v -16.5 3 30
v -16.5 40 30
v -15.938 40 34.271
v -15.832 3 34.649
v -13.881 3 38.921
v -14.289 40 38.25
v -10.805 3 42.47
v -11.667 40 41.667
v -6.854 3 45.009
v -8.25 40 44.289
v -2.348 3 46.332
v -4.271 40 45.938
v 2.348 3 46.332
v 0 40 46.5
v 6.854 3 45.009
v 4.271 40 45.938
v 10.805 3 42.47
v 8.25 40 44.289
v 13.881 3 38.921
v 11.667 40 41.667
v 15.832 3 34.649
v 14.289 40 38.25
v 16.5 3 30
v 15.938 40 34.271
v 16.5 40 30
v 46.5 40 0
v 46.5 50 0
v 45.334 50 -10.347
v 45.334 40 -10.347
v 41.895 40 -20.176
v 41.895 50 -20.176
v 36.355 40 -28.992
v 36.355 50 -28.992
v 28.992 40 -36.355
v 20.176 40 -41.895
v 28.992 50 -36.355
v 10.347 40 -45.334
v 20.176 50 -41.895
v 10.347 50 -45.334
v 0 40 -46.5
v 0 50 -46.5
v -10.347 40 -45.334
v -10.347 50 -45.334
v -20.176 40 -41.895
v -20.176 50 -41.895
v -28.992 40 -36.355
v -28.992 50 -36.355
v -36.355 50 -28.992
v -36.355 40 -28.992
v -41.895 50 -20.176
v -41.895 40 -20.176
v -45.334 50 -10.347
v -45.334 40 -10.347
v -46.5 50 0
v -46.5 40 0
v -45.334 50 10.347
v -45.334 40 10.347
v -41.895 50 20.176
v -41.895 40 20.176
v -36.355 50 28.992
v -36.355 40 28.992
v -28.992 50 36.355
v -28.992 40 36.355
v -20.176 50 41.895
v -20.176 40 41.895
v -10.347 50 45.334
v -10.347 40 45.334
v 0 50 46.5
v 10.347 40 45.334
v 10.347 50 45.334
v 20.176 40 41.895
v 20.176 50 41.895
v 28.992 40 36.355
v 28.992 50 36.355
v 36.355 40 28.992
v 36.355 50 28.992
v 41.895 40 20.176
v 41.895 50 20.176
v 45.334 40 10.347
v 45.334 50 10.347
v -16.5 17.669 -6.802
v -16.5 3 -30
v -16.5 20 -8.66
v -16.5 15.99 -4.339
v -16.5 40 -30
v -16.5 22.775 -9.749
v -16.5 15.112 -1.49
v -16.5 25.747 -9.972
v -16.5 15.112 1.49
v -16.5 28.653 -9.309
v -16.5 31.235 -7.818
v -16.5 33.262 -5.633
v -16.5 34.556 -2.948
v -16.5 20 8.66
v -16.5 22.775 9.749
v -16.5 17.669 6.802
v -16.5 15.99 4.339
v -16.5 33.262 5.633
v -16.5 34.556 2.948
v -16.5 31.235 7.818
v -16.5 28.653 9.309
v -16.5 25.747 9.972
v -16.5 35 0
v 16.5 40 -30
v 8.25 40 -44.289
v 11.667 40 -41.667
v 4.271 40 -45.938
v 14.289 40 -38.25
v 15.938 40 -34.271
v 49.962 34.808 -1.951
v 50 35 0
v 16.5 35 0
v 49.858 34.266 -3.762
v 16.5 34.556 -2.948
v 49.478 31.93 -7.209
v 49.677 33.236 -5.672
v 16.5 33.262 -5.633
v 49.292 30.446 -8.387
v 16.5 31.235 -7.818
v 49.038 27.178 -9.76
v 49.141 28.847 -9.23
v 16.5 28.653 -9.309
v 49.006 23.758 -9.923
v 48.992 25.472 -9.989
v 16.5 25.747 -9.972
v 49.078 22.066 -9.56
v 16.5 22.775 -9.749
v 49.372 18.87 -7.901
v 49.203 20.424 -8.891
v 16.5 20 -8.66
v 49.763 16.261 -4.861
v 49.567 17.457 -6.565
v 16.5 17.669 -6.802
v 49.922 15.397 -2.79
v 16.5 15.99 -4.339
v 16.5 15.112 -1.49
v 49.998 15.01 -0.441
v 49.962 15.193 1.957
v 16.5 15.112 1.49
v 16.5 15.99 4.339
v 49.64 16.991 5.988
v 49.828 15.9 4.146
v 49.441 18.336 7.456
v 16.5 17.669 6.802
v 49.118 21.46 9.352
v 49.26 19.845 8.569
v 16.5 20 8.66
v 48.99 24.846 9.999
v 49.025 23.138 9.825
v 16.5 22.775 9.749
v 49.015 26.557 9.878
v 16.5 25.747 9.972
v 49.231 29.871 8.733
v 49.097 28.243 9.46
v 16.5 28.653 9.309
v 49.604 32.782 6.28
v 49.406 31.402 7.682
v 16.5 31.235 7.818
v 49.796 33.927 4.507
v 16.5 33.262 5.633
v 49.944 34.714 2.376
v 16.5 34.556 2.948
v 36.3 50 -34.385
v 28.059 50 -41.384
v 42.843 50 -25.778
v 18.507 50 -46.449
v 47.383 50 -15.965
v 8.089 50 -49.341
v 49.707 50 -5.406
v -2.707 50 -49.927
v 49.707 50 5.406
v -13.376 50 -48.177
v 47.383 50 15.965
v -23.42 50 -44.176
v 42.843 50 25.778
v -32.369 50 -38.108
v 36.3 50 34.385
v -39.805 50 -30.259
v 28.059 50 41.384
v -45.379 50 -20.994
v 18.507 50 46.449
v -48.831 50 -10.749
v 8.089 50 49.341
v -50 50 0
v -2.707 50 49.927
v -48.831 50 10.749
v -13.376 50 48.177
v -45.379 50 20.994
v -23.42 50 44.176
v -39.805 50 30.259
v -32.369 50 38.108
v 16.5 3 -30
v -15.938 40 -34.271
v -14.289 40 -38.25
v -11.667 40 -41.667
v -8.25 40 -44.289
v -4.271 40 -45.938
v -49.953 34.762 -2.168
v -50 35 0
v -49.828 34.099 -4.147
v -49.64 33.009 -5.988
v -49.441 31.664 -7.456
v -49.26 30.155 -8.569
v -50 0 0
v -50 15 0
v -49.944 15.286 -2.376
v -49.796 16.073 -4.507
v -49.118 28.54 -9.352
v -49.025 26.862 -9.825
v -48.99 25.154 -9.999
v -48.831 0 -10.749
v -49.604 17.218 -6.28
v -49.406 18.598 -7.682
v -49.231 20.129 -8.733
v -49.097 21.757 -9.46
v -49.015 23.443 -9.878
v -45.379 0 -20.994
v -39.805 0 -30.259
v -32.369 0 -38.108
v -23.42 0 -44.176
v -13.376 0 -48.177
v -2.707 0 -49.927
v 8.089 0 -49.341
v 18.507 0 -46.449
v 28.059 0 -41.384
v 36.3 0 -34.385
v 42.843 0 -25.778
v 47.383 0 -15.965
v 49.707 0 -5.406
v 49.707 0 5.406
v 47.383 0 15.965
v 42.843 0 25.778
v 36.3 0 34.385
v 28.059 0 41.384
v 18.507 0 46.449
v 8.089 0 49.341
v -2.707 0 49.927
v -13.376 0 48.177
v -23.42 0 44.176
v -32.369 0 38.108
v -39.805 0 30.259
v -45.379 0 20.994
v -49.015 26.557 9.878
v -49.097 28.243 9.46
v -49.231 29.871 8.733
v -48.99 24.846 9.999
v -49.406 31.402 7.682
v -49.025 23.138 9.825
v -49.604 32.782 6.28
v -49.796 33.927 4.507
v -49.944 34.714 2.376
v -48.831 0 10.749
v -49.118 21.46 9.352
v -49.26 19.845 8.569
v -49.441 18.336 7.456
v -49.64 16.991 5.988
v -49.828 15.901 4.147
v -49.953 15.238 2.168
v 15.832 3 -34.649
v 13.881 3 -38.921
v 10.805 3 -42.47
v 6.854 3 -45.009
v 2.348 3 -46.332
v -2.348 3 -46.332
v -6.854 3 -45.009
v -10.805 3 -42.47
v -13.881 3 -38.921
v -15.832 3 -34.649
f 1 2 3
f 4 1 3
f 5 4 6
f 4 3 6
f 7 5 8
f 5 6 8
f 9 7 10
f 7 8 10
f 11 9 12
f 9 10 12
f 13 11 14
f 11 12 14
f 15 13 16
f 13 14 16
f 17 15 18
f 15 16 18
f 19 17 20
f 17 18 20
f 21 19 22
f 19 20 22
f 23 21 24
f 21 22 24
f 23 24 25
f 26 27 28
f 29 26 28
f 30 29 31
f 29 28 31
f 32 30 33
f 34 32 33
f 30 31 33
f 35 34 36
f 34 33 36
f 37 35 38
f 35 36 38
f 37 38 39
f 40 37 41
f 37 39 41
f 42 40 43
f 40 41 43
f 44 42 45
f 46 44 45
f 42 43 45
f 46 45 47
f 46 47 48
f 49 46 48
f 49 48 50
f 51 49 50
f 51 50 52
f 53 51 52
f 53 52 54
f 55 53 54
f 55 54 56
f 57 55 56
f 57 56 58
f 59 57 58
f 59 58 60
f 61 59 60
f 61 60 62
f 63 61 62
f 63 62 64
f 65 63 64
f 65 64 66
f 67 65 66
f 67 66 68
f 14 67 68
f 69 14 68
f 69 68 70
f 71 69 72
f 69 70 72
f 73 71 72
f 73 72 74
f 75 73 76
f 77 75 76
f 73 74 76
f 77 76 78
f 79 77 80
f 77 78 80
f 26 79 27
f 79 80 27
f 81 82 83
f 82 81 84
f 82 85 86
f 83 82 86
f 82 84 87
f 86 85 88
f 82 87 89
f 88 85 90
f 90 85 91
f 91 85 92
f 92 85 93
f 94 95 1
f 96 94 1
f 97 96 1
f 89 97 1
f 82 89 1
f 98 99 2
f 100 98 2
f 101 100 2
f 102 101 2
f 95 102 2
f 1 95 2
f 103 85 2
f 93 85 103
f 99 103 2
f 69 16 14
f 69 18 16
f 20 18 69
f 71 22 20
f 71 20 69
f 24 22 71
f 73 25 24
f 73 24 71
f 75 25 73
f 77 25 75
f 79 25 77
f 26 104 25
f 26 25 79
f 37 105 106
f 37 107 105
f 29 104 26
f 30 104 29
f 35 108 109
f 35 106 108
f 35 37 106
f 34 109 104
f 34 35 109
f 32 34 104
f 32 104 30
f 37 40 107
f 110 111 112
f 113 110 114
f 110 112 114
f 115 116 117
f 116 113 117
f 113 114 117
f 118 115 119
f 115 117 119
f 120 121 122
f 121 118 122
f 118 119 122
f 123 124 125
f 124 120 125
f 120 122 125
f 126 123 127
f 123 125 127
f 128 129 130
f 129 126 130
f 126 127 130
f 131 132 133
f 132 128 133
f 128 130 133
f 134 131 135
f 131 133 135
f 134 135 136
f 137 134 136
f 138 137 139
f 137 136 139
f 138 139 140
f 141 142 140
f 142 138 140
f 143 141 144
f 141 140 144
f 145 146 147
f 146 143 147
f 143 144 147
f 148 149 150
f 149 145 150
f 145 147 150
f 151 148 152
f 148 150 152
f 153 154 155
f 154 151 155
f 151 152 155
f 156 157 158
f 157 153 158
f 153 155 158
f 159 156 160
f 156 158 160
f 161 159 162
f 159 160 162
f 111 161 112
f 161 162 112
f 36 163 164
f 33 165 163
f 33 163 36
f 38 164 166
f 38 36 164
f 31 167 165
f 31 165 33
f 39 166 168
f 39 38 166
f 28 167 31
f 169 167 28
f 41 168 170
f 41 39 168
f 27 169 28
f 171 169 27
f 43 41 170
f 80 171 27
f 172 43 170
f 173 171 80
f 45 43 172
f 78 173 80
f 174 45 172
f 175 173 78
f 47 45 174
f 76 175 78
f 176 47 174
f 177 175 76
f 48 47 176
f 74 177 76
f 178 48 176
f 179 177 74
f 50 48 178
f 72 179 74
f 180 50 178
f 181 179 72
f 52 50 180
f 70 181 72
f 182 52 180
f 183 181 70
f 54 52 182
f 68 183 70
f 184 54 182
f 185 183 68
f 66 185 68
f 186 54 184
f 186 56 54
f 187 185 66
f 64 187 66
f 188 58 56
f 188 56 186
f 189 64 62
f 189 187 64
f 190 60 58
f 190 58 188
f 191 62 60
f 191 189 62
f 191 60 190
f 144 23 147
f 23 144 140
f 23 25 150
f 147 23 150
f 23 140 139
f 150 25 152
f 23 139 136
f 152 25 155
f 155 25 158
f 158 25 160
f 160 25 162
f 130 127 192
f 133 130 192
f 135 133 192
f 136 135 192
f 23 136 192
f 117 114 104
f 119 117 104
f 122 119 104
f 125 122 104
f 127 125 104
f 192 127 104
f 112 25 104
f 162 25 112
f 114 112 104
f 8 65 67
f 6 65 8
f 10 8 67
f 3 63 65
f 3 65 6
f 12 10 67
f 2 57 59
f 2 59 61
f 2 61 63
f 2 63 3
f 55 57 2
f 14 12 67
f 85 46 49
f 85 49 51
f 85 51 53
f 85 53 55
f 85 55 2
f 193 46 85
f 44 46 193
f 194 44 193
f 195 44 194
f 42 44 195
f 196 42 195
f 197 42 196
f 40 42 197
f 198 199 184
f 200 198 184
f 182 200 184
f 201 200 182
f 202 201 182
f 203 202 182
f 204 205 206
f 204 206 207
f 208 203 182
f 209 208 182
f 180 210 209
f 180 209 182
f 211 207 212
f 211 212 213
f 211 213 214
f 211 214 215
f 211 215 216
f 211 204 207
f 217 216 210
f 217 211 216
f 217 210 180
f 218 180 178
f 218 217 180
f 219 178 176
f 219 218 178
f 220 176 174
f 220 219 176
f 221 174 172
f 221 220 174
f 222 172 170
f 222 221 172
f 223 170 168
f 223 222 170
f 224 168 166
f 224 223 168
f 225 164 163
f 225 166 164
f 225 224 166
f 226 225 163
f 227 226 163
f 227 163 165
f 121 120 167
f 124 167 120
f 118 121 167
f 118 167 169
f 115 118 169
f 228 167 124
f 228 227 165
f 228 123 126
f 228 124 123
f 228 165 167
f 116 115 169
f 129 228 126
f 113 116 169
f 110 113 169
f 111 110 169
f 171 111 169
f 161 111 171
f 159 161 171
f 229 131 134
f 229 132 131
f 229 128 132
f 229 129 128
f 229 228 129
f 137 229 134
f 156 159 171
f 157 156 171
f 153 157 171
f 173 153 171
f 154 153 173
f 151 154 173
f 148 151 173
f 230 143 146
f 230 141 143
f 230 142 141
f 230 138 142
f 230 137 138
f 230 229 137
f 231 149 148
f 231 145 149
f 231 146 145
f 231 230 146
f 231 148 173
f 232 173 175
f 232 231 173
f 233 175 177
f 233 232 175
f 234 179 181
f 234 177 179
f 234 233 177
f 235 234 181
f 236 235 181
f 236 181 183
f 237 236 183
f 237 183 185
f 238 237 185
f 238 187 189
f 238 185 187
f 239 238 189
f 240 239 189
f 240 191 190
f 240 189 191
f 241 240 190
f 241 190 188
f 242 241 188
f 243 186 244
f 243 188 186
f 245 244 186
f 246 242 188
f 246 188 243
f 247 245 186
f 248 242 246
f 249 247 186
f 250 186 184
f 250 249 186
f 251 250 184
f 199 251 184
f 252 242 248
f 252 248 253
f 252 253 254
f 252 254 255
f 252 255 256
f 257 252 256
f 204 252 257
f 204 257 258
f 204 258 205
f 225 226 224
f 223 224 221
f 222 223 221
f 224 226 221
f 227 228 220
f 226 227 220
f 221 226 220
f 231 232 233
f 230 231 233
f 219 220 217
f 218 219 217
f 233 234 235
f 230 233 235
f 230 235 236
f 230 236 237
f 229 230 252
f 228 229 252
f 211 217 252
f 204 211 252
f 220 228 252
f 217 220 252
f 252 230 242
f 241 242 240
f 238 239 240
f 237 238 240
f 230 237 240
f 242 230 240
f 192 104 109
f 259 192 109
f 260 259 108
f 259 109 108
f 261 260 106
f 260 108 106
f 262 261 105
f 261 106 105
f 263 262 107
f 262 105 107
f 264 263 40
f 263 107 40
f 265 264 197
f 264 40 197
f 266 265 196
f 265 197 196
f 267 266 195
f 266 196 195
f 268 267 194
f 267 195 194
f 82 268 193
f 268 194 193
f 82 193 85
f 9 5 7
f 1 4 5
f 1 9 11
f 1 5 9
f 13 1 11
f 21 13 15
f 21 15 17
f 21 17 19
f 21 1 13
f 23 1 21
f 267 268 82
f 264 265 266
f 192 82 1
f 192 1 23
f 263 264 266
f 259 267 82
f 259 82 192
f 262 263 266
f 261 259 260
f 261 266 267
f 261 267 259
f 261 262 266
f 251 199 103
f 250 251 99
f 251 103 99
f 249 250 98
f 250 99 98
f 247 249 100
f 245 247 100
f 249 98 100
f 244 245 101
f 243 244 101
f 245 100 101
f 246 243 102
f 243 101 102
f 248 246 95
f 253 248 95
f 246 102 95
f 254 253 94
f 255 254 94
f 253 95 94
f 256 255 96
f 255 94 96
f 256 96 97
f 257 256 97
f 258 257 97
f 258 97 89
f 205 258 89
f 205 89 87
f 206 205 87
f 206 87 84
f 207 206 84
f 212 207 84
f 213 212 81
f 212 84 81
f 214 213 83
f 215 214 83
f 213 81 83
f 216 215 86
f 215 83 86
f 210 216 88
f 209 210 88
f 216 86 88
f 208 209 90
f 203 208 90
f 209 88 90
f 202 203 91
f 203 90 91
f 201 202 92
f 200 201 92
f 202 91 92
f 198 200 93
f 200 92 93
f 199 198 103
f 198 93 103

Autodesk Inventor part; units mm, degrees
ref_plane "YZ Plane" through (0, 0, 0) normal (1, 0, 0) x (0, 1, 0)
ref_plane "XZ Plane" through (0, 0, 0) normal (0, 1, 0) x (-1, 0, 0)
ref_plane "XY Plane" through (0, 0, 0) normal (0, 0, 1) x (1, 0, 0)
sketch "Sketch1" plane through (0, 0, 0) normal (0, 1, 0) x (-1, 0, 0)
  circle A0 centre (0, 0) radius 50
  dimension "d0" = 100
extrude "Extrusion1" add sketch "Sketch1" along normal blind 50
sketch "Sketch2" plane through (0, 50, 0) normal (0, 1, 0) x (1, 0, 0)
  circle A0 centre (0, 0) radius 46.5
  dimension "d3" = 93
extrude "Extrusion2" cut sketch "Sketch2" against normal blind 10
sketch "Sketch3" plane through (0, 40, 0) normal (0, 1, 0) x (1, 0, 0)
  line L0 (0, -30) -> (0, 30) construction
  line L1 (16.5, -30) -> (16.5, 30)
  line L2 (-16.5, 30) -> (-16.5, -30)
  arc A0 (-16.5, -30) -> (16.5, -30) centre (0, -30) ccw
  arc A1 (16.5, 30) -> (-16.5, 30) centre (0, 30) ccw
  point P0 (0, 0)
  point P1 (0, 0)
  dimension "d6" = 60
extrude "Extrusion3" cut sketch "Sketch3" against normal blind 37
sketch "Sketch4" plane through (0, 0, 0) normal (1, 0, 0) x (0, 1, 0)
  circle A0 centre (25, 0) radius 10
  point P0 (0, 0)
  dimension "d9" = 20
extrude "Extrusion4" cut sketch "Sketch4" along normal through all both and the other way through all
sketch "Sketch5" plane through (0, 0, 0) normal (1, 0, 0) x (0, 1, 0)
  circle A0 centre (25, 0) radius 10 projected
  circle A1 centre (25, 0) radius 10
  point P0 (0, 0)
properties part number "piston"
